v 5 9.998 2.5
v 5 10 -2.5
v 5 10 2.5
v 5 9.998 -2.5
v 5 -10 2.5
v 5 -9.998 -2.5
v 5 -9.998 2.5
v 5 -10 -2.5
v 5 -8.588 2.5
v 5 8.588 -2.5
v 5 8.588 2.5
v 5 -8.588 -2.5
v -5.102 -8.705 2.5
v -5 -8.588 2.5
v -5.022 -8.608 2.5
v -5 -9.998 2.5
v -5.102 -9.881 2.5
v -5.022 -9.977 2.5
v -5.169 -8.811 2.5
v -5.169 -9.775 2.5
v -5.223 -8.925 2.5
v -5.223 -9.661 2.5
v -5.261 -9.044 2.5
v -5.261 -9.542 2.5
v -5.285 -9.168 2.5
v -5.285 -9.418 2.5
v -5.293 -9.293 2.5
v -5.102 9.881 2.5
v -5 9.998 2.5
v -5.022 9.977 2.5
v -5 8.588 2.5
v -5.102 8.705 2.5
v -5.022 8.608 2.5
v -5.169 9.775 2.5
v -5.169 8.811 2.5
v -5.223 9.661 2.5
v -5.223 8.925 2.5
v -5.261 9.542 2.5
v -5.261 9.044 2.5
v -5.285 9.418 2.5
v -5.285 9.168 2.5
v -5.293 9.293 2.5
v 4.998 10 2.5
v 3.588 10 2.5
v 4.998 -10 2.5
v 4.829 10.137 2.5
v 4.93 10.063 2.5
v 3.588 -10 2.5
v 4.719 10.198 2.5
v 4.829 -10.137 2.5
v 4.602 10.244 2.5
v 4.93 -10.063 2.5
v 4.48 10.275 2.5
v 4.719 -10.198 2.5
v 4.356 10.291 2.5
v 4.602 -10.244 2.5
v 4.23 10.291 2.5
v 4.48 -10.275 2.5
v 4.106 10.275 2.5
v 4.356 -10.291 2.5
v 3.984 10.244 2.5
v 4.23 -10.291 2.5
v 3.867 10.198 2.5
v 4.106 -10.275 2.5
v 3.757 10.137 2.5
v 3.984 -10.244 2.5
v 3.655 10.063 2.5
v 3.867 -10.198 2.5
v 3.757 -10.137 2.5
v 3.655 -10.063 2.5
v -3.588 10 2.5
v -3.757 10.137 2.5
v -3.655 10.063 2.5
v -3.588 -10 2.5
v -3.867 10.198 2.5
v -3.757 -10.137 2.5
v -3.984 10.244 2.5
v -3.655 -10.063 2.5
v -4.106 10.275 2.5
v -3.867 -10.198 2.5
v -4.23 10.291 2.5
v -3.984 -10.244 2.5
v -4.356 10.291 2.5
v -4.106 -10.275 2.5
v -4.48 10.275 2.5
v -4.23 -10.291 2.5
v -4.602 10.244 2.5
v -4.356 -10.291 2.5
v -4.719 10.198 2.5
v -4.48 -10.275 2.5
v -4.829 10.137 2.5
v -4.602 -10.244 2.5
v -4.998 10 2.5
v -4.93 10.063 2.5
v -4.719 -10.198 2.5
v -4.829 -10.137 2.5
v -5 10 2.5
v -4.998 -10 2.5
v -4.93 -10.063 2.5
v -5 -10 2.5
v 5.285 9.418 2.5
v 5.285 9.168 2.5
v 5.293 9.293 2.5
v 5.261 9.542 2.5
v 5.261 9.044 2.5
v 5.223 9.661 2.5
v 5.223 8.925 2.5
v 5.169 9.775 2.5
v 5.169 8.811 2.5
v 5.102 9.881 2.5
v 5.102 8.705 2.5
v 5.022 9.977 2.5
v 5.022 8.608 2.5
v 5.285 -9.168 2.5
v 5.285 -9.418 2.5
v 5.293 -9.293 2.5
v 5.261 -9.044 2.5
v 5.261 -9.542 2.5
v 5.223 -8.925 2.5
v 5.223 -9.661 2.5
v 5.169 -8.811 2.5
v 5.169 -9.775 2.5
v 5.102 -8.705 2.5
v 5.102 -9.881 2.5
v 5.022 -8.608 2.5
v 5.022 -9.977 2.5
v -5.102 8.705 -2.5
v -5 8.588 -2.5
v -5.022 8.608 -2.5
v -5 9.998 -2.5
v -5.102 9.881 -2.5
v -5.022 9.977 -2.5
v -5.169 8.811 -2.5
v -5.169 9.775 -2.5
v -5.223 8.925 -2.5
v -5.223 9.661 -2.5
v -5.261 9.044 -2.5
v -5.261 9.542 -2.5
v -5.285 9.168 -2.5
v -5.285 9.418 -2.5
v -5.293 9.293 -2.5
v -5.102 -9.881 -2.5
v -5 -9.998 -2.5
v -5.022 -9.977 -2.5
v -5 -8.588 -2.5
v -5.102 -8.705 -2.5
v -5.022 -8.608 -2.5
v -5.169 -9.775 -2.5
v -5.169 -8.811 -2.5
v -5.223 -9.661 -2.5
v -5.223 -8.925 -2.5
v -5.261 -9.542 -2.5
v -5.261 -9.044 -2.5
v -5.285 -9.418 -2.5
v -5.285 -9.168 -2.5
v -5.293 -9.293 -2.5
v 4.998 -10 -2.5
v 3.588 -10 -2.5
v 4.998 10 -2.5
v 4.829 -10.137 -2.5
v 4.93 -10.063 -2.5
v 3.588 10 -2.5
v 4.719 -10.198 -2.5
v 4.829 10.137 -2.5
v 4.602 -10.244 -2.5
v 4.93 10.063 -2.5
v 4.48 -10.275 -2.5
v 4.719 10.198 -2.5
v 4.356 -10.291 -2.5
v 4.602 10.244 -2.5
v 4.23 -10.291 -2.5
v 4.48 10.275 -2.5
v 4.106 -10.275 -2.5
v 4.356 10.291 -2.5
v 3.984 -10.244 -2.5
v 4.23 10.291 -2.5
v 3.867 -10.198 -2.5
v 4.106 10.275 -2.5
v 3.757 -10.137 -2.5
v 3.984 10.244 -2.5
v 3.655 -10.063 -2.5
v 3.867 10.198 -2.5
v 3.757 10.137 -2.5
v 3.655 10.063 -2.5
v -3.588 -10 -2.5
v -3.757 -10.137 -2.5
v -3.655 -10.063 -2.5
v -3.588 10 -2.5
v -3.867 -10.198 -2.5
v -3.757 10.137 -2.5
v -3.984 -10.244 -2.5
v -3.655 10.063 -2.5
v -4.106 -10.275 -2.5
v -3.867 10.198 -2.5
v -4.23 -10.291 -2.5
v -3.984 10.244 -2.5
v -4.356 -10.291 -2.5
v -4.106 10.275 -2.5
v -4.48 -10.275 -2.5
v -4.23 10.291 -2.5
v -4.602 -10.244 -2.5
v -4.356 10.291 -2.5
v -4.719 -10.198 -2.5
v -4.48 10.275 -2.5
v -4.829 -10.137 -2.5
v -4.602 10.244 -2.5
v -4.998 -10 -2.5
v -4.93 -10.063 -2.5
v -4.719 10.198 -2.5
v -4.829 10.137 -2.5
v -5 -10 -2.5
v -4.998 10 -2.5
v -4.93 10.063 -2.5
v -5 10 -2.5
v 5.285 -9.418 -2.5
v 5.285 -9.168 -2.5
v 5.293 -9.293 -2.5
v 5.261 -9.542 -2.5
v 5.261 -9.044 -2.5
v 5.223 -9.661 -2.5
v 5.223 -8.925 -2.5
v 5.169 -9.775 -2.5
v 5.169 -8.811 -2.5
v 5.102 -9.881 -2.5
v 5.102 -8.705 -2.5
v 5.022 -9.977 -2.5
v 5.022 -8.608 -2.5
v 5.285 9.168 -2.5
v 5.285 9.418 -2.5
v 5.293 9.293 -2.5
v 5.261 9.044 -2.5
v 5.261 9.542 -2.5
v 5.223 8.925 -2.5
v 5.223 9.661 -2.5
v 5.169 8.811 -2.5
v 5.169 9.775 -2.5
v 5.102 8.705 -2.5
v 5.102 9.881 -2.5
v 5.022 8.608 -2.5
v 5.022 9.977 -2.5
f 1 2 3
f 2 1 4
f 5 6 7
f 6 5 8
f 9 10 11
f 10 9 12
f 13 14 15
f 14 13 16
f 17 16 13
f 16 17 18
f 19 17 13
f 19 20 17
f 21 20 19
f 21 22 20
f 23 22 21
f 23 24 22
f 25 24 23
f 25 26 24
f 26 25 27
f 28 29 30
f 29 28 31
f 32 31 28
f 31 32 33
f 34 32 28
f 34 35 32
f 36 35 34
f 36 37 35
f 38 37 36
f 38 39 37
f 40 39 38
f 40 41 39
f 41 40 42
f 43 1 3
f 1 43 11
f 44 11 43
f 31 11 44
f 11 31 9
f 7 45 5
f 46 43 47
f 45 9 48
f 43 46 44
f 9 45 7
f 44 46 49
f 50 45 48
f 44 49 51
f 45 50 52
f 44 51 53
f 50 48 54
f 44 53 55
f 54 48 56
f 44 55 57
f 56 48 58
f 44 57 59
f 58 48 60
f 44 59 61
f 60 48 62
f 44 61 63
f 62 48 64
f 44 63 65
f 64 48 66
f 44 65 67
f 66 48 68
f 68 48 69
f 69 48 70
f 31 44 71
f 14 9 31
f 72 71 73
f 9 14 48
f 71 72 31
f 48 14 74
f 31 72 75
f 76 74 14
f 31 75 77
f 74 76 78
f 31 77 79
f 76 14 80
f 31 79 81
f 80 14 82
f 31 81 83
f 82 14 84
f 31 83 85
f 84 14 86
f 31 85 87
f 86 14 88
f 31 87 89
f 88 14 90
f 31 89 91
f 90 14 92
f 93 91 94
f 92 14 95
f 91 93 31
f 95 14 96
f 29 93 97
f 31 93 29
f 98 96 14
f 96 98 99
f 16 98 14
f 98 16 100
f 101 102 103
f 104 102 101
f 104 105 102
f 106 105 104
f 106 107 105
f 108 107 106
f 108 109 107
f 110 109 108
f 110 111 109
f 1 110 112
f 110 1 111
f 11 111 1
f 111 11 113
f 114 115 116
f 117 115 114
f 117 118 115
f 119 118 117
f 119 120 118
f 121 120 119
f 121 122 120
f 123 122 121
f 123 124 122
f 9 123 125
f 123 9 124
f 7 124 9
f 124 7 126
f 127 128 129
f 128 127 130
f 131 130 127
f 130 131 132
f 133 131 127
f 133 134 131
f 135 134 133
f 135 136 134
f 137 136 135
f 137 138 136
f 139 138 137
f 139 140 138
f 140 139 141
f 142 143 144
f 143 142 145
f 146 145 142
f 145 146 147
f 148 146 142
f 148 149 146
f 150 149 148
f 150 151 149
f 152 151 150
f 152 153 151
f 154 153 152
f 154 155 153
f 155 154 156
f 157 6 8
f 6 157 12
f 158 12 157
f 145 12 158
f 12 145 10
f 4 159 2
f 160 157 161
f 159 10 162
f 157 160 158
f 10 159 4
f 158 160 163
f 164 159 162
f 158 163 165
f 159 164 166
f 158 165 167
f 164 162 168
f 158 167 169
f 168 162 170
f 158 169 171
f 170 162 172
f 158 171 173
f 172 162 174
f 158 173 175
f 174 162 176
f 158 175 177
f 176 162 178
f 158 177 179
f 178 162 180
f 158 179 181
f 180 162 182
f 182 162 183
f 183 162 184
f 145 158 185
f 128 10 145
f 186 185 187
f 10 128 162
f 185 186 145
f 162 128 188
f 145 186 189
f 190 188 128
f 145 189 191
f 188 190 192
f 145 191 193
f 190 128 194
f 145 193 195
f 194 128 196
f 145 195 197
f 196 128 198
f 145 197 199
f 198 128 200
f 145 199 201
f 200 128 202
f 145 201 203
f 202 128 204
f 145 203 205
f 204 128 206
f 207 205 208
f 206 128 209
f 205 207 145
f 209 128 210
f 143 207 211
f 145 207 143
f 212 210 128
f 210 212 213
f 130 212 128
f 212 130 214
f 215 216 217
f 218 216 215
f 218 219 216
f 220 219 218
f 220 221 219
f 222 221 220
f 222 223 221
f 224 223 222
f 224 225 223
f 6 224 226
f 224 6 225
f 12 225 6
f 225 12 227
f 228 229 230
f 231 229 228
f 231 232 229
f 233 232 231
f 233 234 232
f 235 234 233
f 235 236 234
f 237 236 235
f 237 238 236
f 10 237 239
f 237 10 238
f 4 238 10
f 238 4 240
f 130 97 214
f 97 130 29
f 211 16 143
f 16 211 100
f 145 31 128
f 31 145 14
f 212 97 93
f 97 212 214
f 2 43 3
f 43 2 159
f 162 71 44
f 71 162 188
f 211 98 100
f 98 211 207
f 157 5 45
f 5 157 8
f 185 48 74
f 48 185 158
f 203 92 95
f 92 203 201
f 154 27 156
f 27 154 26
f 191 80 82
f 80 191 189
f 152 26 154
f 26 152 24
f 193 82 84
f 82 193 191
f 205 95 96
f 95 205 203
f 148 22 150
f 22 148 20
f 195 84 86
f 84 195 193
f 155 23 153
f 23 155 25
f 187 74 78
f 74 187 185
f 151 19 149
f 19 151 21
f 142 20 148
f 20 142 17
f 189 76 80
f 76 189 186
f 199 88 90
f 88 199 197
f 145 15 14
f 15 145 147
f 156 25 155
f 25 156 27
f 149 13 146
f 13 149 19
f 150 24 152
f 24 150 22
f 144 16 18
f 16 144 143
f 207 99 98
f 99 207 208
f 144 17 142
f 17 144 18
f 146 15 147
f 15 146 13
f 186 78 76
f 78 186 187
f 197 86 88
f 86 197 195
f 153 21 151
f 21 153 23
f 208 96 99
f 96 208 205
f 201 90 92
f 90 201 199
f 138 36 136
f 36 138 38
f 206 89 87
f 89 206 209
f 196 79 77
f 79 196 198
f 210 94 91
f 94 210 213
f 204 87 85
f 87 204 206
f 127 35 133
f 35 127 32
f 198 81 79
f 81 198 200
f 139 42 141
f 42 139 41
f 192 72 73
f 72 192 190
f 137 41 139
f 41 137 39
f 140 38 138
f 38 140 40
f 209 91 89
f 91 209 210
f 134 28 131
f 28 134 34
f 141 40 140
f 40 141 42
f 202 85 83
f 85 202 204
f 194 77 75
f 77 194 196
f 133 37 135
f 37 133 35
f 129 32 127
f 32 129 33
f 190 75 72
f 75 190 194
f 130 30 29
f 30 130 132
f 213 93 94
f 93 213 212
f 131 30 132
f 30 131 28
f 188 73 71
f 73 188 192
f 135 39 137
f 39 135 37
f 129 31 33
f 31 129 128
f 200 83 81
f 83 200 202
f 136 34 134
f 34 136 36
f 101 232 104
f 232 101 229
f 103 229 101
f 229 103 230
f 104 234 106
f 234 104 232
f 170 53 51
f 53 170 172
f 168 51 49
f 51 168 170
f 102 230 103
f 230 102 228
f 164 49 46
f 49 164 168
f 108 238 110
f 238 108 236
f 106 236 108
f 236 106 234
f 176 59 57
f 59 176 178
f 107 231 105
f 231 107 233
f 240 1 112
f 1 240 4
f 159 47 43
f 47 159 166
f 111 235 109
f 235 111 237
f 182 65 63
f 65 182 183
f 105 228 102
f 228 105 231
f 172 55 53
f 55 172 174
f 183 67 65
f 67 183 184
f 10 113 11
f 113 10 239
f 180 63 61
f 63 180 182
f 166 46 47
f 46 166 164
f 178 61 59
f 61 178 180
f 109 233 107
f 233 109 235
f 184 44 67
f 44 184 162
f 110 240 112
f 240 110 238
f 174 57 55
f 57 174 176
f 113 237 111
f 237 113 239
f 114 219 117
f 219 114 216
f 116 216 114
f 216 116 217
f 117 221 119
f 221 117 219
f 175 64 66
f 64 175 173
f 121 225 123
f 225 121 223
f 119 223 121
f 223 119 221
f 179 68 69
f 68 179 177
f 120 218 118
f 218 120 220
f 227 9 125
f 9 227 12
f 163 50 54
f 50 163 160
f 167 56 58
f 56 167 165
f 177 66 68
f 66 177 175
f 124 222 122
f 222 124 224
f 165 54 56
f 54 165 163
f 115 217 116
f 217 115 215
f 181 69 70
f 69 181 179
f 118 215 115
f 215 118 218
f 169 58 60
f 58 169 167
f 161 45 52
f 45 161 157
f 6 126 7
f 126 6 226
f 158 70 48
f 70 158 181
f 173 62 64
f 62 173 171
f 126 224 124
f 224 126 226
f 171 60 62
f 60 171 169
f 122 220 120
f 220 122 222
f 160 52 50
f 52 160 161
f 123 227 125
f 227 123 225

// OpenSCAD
// And extruded rectangle with dog bones at their end
module dog_bone(dimensions, bit_diameter=1, center=false) {
  module hole() { cylinder(dimensions.z, d=bit_diameter, center=center, $fn=50); }
  inset = sqrt(2 * pow(bit_diameter / 2, 2)) / 2;
  x = dimensions.x / 2 - inset;
  y = dimensions.y / 2 - inset;
  cube(dimensions, center=center);
  translate([-x, -y, 0]) hole();
  translate([-x, y, 0]) hole();
  translate([x, y, 0]) hole();
  translate([x, -y, 0]) hole();
}

dog_bone([10, 20, 5], 2, center=true);
